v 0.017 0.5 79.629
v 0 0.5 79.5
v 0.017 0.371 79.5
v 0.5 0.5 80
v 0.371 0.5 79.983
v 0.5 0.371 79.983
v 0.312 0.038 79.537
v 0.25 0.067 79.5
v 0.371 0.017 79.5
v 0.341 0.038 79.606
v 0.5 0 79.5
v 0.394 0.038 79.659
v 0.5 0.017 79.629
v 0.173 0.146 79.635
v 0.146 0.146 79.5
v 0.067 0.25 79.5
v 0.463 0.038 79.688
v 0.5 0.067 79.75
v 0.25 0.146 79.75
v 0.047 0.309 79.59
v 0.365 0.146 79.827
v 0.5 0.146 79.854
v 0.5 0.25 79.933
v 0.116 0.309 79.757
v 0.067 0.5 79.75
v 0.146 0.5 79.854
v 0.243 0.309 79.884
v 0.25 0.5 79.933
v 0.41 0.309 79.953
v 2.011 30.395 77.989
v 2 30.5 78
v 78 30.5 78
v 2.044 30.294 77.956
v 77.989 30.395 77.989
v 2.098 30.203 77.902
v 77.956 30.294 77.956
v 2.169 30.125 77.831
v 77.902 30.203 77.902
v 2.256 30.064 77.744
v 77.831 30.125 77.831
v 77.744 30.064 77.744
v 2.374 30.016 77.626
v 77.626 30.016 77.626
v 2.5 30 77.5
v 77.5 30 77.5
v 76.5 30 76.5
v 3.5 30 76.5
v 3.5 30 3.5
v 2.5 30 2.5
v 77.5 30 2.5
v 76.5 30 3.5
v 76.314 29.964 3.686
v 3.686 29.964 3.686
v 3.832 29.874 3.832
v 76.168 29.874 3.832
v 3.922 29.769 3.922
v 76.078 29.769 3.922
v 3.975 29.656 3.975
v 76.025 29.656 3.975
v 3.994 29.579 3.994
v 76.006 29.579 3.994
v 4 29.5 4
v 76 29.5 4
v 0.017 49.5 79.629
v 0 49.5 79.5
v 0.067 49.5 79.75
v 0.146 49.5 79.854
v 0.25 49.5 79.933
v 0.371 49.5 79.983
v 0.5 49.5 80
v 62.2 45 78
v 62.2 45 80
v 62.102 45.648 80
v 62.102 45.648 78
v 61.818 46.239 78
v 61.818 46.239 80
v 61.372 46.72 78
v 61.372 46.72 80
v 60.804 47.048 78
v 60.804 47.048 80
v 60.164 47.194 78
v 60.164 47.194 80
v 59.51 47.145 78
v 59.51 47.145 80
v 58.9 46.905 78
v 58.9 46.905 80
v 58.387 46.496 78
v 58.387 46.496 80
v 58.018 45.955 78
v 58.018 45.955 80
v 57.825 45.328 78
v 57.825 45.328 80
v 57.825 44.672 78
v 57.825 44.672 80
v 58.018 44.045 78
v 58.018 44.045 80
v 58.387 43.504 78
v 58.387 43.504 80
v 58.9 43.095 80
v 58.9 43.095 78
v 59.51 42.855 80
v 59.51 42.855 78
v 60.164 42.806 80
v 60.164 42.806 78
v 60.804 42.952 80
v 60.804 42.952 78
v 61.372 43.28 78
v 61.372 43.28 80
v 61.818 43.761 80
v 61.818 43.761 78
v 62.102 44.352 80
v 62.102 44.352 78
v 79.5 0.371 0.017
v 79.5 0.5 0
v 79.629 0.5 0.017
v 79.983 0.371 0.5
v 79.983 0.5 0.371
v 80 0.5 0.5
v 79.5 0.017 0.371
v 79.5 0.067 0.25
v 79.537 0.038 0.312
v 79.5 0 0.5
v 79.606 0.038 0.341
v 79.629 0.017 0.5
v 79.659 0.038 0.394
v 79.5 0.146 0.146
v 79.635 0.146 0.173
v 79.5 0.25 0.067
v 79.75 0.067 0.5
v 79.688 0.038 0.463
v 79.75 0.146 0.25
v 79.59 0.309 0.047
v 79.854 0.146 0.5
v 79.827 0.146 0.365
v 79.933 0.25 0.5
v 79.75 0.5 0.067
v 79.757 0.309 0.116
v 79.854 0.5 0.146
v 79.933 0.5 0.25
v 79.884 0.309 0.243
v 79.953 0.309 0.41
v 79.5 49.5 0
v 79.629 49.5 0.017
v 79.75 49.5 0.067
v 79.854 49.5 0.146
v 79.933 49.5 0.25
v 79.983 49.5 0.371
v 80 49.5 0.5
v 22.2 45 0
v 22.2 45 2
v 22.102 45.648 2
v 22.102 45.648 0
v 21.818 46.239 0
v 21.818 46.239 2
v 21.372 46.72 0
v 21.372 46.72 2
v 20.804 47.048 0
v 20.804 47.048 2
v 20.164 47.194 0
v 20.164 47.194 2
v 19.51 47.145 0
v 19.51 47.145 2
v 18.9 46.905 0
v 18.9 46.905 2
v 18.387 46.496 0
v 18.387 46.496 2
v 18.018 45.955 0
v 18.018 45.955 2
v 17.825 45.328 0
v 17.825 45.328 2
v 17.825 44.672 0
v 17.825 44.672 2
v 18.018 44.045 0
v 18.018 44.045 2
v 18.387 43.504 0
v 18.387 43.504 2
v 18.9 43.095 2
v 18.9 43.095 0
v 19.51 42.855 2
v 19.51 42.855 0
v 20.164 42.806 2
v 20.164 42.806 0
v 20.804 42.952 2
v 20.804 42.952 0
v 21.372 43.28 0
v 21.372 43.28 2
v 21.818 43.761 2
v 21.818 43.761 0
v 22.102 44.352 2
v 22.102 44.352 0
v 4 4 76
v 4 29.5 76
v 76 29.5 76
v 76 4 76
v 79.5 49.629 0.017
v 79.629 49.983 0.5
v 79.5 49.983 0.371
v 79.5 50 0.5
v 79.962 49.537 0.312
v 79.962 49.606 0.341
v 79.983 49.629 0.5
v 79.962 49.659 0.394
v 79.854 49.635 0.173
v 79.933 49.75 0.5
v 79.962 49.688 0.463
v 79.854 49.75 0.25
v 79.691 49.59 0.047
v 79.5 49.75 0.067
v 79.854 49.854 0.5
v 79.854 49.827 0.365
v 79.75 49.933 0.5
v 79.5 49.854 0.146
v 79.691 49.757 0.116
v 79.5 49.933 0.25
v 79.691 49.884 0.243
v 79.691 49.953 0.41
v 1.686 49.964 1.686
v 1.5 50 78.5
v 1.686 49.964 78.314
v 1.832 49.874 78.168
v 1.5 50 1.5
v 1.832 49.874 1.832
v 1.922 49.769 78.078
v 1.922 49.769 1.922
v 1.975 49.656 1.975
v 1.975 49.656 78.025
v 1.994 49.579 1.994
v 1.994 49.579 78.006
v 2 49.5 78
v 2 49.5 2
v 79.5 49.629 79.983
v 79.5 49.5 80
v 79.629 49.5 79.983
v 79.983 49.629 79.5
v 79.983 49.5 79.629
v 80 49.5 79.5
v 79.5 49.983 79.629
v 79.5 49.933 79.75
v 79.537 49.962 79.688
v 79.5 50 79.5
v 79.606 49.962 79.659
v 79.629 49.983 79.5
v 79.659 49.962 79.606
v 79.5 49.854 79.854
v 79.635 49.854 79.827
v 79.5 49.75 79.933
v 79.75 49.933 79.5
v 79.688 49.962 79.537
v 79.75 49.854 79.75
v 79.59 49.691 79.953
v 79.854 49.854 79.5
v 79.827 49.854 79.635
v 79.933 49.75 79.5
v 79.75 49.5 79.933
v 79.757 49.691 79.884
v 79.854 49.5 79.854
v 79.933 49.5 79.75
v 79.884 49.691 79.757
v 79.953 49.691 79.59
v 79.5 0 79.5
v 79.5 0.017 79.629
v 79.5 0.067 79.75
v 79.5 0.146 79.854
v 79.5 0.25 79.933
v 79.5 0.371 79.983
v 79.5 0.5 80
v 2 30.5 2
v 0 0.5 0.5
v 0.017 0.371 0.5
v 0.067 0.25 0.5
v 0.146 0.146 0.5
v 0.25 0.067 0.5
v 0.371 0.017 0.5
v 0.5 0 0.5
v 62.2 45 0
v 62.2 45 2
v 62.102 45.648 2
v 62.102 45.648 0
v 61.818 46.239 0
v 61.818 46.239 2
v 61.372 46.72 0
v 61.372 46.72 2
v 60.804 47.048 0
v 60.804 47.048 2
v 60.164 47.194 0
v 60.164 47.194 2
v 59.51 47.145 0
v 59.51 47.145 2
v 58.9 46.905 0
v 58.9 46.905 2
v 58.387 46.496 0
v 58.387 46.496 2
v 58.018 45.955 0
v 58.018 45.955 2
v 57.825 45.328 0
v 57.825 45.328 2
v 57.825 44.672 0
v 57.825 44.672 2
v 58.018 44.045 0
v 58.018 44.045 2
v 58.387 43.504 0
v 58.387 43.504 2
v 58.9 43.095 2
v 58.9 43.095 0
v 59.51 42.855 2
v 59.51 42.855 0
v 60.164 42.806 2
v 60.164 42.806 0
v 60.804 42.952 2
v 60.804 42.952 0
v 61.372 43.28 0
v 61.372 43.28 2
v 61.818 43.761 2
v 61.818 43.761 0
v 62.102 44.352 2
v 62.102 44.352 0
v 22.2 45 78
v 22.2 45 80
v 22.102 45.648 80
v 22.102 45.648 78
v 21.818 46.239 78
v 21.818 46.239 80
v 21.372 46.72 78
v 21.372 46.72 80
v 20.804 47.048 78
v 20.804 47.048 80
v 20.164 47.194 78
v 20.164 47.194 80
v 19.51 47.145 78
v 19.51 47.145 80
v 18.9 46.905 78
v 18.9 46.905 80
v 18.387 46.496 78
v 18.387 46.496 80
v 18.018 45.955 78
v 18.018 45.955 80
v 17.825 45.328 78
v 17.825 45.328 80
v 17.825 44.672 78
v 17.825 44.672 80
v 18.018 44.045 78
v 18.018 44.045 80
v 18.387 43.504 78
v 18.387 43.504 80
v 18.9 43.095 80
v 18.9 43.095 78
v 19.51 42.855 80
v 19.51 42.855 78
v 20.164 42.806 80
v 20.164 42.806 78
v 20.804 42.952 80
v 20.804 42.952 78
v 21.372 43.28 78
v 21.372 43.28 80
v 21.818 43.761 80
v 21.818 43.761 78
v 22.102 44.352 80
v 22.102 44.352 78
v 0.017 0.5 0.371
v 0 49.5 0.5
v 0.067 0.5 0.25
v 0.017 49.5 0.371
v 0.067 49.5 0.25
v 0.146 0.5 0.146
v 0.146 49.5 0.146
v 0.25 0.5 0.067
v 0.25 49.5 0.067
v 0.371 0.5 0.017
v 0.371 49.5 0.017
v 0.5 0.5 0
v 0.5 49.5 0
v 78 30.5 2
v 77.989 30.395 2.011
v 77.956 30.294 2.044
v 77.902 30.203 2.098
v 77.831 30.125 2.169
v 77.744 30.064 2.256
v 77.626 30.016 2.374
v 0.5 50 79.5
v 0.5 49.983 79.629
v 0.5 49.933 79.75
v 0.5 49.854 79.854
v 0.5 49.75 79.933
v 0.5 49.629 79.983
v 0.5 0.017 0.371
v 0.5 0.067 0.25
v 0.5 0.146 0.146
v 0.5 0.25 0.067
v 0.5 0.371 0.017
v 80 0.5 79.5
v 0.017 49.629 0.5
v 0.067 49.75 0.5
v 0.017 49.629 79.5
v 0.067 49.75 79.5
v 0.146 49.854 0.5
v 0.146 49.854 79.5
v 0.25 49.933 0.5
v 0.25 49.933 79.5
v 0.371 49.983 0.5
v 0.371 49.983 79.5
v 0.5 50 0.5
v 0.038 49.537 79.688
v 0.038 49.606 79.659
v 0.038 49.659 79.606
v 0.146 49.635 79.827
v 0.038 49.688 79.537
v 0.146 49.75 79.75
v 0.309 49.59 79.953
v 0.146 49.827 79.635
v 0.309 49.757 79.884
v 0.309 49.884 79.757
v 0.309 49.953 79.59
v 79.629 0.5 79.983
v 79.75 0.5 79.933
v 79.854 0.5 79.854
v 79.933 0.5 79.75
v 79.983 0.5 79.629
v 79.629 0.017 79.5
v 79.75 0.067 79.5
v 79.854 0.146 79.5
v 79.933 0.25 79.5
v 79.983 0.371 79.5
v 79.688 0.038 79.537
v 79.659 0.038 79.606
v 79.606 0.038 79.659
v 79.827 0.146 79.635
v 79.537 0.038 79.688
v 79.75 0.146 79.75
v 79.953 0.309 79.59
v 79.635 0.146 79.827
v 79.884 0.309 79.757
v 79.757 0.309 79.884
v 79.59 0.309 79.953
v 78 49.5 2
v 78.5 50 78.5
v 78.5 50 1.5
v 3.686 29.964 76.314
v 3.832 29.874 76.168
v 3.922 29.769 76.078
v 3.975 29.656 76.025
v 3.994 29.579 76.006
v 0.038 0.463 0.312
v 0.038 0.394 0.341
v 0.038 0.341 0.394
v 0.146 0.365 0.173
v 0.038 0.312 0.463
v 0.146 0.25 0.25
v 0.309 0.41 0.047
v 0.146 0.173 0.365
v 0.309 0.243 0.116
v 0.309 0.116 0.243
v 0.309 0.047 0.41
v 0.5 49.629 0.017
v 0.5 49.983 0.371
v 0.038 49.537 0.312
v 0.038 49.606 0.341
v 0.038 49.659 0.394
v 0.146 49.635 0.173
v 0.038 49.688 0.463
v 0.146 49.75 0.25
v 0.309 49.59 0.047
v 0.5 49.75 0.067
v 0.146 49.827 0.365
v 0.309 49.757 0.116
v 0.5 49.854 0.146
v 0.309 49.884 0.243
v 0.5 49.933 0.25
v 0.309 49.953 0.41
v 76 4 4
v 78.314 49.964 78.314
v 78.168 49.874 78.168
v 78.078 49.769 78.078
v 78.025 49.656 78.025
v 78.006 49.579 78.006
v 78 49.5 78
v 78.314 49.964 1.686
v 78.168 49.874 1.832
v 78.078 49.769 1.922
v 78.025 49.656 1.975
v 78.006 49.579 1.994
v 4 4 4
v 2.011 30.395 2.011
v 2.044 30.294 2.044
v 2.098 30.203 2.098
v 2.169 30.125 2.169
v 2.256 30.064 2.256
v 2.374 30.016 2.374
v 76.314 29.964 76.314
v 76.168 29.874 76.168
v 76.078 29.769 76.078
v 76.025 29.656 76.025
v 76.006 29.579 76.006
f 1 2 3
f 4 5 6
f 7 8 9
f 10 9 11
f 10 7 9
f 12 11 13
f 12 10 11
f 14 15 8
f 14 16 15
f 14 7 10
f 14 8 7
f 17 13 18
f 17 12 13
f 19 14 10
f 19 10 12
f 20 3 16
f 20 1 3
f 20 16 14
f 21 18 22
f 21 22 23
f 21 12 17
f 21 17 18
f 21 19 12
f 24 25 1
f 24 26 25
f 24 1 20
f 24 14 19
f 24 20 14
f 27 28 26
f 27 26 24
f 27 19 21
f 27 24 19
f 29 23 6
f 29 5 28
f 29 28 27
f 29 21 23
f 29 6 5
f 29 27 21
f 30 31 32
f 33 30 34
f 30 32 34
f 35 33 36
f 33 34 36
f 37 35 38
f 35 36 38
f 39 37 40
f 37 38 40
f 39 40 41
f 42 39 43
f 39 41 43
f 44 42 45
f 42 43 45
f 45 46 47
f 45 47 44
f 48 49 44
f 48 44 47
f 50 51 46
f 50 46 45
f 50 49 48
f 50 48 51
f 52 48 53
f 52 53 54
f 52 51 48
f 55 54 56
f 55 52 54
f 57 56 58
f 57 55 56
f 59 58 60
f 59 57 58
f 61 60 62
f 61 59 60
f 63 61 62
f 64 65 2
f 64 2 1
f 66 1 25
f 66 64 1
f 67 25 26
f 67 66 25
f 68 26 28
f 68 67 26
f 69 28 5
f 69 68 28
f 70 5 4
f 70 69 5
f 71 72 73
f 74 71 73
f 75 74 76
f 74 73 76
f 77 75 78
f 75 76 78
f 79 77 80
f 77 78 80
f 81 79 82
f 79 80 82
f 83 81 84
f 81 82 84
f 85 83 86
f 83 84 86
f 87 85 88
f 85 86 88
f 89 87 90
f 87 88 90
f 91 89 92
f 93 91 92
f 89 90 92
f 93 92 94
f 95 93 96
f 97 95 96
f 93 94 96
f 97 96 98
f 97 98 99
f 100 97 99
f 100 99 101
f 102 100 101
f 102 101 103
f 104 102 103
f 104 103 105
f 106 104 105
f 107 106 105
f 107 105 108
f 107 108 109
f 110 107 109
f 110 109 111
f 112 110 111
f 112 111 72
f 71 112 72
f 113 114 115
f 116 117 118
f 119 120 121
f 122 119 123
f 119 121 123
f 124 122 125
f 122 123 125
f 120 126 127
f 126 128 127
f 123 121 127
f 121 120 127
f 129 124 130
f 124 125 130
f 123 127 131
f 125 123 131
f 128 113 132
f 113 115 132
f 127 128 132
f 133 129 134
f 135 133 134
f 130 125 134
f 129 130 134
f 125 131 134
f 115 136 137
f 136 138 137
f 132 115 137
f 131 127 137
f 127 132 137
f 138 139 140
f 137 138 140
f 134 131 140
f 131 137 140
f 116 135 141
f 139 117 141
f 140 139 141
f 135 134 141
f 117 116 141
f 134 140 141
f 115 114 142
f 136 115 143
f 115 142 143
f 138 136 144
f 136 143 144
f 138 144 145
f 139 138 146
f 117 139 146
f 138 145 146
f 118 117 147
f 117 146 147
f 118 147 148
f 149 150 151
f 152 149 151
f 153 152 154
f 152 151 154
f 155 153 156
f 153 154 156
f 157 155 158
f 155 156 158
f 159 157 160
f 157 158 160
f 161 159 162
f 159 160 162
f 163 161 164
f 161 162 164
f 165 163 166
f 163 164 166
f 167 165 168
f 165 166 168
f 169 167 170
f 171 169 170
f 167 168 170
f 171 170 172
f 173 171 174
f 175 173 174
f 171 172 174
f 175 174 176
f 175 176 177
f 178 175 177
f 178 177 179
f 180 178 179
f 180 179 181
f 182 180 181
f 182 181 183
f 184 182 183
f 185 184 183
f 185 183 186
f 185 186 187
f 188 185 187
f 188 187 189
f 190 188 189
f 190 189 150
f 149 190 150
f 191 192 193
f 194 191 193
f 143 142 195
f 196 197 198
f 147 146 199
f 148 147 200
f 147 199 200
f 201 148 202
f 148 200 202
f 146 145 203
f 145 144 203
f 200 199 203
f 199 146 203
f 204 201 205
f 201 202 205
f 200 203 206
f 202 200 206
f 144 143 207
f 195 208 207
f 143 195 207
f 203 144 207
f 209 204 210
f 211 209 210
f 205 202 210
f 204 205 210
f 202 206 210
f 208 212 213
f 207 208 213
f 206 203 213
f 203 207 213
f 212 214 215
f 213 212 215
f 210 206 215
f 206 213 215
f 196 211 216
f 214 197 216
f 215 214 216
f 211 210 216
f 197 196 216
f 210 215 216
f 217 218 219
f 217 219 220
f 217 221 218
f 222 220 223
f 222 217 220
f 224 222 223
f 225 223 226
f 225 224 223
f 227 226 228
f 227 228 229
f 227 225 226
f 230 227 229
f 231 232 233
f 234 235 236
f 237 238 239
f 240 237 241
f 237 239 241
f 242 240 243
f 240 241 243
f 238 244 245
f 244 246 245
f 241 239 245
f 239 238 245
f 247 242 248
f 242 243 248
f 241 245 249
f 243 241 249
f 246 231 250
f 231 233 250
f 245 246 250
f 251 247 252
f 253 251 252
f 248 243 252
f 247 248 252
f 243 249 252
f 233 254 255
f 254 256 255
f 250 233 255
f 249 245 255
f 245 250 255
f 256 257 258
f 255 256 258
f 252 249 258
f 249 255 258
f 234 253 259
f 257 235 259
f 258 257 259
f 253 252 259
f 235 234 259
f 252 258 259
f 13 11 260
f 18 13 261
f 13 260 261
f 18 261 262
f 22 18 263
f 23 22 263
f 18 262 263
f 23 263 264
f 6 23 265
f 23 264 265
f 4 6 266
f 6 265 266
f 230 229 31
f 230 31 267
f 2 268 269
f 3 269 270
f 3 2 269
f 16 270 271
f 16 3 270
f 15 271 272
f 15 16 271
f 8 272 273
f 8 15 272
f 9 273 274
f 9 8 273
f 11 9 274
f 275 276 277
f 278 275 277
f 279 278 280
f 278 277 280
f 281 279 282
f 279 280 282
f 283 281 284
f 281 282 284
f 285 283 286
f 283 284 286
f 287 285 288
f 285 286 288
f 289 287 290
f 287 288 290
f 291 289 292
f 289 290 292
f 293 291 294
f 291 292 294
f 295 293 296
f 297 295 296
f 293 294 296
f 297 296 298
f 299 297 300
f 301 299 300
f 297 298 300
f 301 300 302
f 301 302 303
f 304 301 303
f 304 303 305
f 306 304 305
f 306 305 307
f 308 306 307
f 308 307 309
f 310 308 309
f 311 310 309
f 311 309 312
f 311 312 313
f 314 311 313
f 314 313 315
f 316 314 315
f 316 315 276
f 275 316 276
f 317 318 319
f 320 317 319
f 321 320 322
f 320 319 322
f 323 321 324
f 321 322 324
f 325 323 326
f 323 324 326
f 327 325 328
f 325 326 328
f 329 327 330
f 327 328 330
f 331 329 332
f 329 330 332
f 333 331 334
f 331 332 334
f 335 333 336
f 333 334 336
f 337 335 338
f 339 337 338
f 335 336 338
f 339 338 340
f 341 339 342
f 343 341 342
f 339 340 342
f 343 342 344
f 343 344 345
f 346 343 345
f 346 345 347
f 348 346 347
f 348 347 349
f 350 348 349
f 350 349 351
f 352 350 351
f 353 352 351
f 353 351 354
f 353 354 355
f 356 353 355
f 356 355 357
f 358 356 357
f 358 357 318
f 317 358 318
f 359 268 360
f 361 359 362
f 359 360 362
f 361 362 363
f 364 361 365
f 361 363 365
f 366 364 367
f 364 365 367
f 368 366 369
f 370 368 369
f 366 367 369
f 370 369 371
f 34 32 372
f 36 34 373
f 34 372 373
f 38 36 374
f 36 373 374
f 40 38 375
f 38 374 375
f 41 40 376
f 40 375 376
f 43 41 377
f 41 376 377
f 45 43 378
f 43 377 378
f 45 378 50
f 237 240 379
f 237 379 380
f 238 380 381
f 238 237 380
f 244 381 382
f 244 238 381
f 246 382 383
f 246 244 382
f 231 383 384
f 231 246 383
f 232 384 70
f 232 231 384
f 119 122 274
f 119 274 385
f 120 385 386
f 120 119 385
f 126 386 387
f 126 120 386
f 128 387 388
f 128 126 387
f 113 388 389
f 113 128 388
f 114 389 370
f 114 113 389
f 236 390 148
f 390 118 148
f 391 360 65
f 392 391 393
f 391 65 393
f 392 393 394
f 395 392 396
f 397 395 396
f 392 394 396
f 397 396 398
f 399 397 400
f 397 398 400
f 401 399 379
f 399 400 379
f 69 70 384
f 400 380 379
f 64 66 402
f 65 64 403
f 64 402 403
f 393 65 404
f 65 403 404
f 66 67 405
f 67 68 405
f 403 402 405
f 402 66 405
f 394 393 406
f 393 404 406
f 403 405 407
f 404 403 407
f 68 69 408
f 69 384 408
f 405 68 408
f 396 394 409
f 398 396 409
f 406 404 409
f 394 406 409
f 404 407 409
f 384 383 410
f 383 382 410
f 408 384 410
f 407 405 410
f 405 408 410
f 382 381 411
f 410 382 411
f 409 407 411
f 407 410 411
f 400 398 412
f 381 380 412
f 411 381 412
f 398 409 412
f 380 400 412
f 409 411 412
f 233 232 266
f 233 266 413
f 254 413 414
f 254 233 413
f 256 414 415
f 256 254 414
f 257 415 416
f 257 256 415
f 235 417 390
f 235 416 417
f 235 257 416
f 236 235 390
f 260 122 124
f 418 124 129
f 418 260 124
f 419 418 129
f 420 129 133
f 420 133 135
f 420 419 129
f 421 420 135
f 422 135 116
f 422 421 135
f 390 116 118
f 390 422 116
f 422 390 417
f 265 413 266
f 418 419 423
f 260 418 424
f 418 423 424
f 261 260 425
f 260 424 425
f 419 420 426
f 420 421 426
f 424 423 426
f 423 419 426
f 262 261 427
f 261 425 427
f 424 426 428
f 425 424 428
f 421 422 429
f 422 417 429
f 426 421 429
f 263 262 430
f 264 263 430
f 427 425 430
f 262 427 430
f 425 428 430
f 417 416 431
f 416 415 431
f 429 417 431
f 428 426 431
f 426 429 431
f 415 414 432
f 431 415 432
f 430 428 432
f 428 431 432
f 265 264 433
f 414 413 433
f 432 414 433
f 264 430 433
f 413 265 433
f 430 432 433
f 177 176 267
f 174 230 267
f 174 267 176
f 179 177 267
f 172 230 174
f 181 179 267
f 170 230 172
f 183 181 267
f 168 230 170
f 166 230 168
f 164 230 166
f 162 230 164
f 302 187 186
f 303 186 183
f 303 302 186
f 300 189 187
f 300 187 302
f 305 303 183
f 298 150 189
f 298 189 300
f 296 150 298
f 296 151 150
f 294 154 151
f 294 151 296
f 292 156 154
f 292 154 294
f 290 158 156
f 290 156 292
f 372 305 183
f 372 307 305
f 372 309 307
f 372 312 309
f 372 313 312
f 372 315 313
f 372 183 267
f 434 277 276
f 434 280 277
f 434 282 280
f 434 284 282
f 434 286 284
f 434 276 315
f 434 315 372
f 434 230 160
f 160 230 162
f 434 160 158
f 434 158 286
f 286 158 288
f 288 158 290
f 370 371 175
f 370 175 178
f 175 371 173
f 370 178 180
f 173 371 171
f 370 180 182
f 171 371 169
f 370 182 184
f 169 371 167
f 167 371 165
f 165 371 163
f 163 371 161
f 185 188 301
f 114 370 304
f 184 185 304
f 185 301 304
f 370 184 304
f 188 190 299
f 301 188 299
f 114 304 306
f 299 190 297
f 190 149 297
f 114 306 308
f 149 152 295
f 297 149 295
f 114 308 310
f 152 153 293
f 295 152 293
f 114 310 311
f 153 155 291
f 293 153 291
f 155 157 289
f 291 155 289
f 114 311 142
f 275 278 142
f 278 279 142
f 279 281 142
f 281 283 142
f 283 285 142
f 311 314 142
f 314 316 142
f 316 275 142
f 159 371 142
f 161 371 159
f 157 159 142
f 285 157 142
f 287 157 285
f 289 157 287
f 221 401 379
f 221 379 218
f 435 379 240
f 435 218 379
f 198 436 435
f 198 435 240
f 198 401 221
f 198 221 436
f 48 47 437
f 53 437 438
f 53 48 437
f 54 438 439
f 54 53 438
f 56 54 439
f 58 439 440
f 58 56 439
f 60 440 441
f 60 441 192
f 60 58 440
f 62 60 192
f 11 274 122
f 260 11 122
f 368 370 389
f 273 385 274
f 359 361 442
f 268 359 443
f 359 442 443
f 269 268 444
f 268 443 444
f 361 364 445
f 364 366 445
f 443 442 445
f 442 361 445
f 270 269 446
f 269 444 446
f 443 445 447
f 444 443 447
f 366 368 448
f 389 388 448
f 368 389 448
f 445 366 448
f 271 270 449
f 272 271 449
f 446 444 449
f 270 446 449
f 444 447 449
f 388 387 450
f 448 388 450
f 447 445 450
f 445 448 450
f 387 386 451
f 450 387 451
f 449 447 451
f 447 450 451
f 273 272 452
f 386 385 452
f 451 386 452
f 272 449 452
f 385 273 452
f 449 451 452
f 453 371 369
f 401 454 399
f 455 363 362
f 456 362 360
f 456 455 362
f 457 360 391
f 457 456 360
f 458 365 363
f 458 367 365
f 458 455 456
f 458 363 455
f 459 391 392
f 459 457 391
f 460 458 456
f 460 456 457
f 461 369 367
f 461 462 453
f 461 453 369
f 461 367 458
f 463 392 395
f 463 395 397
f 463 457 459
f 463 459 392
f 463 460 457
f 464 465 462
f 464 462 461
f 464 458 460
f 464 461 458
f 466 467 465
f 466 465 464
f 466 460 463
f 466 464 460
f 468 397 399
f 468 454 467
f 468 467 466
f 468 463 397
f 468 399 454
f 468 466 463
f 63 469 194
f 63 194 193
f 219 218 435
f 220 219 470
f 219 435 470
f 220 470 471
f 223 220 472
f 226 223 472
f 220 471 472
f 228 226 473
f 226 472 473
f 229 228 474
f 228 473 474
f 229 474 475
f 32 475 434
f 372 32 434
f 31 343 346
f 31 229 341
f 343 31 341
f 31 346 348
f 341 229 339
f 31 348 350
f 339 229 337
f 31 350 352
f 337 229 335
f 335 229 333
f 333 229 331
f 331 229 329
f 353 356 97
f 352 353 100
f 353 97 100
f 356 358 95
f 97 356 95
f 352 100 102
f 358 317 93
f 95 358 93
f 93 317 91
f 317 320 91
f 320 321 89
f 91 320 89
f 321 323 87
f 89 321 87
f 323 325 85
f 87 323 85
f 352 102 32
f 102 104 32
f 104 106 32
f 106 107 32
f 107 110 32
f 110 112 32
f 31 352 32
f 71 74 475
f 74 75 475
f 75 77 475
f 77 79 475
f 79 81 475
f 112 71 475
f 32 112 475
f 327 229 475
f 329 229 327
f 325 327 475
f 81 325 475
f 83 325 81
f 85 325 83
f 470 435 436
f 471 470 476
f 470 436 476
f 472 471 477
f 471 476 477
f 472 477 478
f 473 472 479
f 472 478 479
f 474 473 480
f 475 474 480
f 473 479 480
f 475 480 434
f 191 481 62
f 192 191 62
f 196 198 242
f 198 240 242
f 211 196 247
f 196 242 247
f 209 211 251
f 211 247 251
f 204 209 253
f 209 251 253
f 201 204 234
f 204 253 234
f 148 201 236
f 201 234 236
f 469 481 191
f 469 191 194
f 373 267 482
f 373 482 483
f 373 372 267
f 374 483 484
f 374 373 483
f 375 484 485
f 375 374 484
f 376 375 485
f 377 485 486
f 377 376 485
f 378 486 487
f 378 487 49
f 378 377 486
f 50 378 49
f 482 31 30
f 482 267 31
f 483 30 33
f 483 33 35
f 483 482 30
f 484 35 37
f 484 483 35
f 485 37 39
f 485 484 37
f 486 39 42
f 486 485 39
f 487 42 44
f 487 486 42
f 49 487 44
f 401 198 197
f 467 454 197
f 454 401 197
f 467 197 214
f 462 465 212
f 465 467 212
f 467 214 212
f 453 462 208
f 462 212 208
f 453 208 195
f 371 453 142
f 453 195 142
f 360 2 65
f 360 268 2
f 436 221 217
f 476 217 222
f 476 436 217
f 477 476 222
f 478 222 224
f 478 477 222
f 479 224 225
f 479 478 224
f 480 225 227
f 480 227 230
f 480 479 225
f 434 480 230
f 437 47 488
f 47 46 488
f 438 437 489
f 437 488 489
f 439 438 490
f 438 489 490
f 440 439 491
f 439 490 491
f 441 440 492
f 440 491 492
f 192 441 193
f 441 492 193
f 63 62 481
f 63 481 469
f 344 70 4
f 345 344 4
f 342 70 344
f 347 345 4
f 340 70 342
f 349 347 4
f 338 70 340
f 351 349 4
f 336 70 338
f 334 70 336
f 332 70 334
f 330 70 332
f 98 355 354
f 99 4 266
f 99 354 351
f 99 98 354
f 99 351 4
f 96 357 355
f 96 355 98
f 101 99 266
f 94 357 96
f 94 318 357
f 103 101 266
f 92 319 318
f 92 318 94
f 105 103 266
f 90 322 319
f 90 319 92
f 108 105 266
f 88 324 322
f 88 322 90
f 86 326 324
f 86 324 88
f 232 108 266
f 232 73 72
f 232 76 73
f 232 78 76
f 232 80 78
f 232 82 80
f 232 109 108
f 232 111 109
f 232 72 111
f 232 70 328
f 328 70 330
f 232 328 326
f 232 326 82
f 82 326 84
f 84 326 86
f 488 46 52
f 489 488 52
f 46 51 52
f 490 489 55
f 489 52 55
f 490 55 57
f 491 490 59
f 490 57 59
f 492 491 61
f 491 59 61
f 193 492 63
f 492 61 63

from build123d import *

# Parameters (mm, degrees)
SKETCH1_W           = 80
SKETCH1_H           = 50
BOSS_EXTRUDE1_DEPTH = 80
SHELL1_T            = -4
SKETCH2_W           = 76
SKETCH2_H           = 76
SKETCH2_W_2         = 72
SKETCH2_H_2         = 72
CUT_EXTRUDE1_DEPTH  = 20
SKETCH3_R           = 2.2
CUT_EXTRUDE2_DEPTH  = 124.693168769
FILLET1_R           = 0.5


with BuildPart() as part:
    # Sketch1 → Boss-Extrude1 (new body)
    with BuildSketch(Plane.XY):
        with Locations((40, 25)):
            Rectangle(SKETCH1_W, SKETCH1_H)
    extrude(amount=BOSS_EXTRUDE1_DEPTH)

    # Shell1
    shell1_openings = [part.faces().sort_by_distance(p)[0] for p in [
        (40, 50, 40),
    ]]
    offset(amount=SHELL1_T, openings=shell1_openings, kind=Kind.INTERSECTION)

    # Sketch2 → Cut-Extrude1 (cut)
    with BuildSketch(Plane(origin=(0, 50, 0), x_dir=(1, 0, 0), z_dir=(0, 1, 0))):
        with Locations((40, -40)):
            Rectangle(SKETCH2_W, SKETCH2_H)
        with Locations((40, -40)):
            Rectangle(SKETCH2_W_2, SKETCH2_H_2, mode=Mode.SUBTRACT)
    extrude(amount=-CUT_EXTRUDE1_DEPTH, mode=Mode.SUBTRACT)

    # Sketch3 → Cut-Extrude2 (cut, through all)
    with BuildSketch(Plane.XY.offset(80)):
        with Locations((20, 45)):
            Circle(SKETCH3_R)
        with Locations((60, 45)):
            Circle(SKETCH3_R)
    extrude(amount=-CUT_EXTRUDE2_DEPTH, mode=Mode.SUBTRACT)

    # Fillet1
    fillet1_edges = [part.edges().sort_by_distance(p)[0] for p in [
        (80, 25, 80),
        (40, 50, 80),
        (4, 30, 40),
        (40, 30, 76),
        (76, 30, 40),
        (40, 50, 2),
        (78, 50, 40),
        (40, 30, 78),
        (2, 30, 40),
        (40, 30, 4),
        (40, 30, 2),
        (78, 30, 40),
        (2, 50, 40),
        (40, 50, 78),
        (0, 25, 80),
        (40, 50, 0),
        (80, 25, 0),
        (40, 0, 0),
        (0, 25, 0),
        (0, 50, 40),
        (80, 50, 40),
        (80, 0, 40),
        (0, 0, 40),
        (40, 0, 80),
    ]]
    fillet(fillet1_edges, radius=FILLET1_R)


solid = part.part
